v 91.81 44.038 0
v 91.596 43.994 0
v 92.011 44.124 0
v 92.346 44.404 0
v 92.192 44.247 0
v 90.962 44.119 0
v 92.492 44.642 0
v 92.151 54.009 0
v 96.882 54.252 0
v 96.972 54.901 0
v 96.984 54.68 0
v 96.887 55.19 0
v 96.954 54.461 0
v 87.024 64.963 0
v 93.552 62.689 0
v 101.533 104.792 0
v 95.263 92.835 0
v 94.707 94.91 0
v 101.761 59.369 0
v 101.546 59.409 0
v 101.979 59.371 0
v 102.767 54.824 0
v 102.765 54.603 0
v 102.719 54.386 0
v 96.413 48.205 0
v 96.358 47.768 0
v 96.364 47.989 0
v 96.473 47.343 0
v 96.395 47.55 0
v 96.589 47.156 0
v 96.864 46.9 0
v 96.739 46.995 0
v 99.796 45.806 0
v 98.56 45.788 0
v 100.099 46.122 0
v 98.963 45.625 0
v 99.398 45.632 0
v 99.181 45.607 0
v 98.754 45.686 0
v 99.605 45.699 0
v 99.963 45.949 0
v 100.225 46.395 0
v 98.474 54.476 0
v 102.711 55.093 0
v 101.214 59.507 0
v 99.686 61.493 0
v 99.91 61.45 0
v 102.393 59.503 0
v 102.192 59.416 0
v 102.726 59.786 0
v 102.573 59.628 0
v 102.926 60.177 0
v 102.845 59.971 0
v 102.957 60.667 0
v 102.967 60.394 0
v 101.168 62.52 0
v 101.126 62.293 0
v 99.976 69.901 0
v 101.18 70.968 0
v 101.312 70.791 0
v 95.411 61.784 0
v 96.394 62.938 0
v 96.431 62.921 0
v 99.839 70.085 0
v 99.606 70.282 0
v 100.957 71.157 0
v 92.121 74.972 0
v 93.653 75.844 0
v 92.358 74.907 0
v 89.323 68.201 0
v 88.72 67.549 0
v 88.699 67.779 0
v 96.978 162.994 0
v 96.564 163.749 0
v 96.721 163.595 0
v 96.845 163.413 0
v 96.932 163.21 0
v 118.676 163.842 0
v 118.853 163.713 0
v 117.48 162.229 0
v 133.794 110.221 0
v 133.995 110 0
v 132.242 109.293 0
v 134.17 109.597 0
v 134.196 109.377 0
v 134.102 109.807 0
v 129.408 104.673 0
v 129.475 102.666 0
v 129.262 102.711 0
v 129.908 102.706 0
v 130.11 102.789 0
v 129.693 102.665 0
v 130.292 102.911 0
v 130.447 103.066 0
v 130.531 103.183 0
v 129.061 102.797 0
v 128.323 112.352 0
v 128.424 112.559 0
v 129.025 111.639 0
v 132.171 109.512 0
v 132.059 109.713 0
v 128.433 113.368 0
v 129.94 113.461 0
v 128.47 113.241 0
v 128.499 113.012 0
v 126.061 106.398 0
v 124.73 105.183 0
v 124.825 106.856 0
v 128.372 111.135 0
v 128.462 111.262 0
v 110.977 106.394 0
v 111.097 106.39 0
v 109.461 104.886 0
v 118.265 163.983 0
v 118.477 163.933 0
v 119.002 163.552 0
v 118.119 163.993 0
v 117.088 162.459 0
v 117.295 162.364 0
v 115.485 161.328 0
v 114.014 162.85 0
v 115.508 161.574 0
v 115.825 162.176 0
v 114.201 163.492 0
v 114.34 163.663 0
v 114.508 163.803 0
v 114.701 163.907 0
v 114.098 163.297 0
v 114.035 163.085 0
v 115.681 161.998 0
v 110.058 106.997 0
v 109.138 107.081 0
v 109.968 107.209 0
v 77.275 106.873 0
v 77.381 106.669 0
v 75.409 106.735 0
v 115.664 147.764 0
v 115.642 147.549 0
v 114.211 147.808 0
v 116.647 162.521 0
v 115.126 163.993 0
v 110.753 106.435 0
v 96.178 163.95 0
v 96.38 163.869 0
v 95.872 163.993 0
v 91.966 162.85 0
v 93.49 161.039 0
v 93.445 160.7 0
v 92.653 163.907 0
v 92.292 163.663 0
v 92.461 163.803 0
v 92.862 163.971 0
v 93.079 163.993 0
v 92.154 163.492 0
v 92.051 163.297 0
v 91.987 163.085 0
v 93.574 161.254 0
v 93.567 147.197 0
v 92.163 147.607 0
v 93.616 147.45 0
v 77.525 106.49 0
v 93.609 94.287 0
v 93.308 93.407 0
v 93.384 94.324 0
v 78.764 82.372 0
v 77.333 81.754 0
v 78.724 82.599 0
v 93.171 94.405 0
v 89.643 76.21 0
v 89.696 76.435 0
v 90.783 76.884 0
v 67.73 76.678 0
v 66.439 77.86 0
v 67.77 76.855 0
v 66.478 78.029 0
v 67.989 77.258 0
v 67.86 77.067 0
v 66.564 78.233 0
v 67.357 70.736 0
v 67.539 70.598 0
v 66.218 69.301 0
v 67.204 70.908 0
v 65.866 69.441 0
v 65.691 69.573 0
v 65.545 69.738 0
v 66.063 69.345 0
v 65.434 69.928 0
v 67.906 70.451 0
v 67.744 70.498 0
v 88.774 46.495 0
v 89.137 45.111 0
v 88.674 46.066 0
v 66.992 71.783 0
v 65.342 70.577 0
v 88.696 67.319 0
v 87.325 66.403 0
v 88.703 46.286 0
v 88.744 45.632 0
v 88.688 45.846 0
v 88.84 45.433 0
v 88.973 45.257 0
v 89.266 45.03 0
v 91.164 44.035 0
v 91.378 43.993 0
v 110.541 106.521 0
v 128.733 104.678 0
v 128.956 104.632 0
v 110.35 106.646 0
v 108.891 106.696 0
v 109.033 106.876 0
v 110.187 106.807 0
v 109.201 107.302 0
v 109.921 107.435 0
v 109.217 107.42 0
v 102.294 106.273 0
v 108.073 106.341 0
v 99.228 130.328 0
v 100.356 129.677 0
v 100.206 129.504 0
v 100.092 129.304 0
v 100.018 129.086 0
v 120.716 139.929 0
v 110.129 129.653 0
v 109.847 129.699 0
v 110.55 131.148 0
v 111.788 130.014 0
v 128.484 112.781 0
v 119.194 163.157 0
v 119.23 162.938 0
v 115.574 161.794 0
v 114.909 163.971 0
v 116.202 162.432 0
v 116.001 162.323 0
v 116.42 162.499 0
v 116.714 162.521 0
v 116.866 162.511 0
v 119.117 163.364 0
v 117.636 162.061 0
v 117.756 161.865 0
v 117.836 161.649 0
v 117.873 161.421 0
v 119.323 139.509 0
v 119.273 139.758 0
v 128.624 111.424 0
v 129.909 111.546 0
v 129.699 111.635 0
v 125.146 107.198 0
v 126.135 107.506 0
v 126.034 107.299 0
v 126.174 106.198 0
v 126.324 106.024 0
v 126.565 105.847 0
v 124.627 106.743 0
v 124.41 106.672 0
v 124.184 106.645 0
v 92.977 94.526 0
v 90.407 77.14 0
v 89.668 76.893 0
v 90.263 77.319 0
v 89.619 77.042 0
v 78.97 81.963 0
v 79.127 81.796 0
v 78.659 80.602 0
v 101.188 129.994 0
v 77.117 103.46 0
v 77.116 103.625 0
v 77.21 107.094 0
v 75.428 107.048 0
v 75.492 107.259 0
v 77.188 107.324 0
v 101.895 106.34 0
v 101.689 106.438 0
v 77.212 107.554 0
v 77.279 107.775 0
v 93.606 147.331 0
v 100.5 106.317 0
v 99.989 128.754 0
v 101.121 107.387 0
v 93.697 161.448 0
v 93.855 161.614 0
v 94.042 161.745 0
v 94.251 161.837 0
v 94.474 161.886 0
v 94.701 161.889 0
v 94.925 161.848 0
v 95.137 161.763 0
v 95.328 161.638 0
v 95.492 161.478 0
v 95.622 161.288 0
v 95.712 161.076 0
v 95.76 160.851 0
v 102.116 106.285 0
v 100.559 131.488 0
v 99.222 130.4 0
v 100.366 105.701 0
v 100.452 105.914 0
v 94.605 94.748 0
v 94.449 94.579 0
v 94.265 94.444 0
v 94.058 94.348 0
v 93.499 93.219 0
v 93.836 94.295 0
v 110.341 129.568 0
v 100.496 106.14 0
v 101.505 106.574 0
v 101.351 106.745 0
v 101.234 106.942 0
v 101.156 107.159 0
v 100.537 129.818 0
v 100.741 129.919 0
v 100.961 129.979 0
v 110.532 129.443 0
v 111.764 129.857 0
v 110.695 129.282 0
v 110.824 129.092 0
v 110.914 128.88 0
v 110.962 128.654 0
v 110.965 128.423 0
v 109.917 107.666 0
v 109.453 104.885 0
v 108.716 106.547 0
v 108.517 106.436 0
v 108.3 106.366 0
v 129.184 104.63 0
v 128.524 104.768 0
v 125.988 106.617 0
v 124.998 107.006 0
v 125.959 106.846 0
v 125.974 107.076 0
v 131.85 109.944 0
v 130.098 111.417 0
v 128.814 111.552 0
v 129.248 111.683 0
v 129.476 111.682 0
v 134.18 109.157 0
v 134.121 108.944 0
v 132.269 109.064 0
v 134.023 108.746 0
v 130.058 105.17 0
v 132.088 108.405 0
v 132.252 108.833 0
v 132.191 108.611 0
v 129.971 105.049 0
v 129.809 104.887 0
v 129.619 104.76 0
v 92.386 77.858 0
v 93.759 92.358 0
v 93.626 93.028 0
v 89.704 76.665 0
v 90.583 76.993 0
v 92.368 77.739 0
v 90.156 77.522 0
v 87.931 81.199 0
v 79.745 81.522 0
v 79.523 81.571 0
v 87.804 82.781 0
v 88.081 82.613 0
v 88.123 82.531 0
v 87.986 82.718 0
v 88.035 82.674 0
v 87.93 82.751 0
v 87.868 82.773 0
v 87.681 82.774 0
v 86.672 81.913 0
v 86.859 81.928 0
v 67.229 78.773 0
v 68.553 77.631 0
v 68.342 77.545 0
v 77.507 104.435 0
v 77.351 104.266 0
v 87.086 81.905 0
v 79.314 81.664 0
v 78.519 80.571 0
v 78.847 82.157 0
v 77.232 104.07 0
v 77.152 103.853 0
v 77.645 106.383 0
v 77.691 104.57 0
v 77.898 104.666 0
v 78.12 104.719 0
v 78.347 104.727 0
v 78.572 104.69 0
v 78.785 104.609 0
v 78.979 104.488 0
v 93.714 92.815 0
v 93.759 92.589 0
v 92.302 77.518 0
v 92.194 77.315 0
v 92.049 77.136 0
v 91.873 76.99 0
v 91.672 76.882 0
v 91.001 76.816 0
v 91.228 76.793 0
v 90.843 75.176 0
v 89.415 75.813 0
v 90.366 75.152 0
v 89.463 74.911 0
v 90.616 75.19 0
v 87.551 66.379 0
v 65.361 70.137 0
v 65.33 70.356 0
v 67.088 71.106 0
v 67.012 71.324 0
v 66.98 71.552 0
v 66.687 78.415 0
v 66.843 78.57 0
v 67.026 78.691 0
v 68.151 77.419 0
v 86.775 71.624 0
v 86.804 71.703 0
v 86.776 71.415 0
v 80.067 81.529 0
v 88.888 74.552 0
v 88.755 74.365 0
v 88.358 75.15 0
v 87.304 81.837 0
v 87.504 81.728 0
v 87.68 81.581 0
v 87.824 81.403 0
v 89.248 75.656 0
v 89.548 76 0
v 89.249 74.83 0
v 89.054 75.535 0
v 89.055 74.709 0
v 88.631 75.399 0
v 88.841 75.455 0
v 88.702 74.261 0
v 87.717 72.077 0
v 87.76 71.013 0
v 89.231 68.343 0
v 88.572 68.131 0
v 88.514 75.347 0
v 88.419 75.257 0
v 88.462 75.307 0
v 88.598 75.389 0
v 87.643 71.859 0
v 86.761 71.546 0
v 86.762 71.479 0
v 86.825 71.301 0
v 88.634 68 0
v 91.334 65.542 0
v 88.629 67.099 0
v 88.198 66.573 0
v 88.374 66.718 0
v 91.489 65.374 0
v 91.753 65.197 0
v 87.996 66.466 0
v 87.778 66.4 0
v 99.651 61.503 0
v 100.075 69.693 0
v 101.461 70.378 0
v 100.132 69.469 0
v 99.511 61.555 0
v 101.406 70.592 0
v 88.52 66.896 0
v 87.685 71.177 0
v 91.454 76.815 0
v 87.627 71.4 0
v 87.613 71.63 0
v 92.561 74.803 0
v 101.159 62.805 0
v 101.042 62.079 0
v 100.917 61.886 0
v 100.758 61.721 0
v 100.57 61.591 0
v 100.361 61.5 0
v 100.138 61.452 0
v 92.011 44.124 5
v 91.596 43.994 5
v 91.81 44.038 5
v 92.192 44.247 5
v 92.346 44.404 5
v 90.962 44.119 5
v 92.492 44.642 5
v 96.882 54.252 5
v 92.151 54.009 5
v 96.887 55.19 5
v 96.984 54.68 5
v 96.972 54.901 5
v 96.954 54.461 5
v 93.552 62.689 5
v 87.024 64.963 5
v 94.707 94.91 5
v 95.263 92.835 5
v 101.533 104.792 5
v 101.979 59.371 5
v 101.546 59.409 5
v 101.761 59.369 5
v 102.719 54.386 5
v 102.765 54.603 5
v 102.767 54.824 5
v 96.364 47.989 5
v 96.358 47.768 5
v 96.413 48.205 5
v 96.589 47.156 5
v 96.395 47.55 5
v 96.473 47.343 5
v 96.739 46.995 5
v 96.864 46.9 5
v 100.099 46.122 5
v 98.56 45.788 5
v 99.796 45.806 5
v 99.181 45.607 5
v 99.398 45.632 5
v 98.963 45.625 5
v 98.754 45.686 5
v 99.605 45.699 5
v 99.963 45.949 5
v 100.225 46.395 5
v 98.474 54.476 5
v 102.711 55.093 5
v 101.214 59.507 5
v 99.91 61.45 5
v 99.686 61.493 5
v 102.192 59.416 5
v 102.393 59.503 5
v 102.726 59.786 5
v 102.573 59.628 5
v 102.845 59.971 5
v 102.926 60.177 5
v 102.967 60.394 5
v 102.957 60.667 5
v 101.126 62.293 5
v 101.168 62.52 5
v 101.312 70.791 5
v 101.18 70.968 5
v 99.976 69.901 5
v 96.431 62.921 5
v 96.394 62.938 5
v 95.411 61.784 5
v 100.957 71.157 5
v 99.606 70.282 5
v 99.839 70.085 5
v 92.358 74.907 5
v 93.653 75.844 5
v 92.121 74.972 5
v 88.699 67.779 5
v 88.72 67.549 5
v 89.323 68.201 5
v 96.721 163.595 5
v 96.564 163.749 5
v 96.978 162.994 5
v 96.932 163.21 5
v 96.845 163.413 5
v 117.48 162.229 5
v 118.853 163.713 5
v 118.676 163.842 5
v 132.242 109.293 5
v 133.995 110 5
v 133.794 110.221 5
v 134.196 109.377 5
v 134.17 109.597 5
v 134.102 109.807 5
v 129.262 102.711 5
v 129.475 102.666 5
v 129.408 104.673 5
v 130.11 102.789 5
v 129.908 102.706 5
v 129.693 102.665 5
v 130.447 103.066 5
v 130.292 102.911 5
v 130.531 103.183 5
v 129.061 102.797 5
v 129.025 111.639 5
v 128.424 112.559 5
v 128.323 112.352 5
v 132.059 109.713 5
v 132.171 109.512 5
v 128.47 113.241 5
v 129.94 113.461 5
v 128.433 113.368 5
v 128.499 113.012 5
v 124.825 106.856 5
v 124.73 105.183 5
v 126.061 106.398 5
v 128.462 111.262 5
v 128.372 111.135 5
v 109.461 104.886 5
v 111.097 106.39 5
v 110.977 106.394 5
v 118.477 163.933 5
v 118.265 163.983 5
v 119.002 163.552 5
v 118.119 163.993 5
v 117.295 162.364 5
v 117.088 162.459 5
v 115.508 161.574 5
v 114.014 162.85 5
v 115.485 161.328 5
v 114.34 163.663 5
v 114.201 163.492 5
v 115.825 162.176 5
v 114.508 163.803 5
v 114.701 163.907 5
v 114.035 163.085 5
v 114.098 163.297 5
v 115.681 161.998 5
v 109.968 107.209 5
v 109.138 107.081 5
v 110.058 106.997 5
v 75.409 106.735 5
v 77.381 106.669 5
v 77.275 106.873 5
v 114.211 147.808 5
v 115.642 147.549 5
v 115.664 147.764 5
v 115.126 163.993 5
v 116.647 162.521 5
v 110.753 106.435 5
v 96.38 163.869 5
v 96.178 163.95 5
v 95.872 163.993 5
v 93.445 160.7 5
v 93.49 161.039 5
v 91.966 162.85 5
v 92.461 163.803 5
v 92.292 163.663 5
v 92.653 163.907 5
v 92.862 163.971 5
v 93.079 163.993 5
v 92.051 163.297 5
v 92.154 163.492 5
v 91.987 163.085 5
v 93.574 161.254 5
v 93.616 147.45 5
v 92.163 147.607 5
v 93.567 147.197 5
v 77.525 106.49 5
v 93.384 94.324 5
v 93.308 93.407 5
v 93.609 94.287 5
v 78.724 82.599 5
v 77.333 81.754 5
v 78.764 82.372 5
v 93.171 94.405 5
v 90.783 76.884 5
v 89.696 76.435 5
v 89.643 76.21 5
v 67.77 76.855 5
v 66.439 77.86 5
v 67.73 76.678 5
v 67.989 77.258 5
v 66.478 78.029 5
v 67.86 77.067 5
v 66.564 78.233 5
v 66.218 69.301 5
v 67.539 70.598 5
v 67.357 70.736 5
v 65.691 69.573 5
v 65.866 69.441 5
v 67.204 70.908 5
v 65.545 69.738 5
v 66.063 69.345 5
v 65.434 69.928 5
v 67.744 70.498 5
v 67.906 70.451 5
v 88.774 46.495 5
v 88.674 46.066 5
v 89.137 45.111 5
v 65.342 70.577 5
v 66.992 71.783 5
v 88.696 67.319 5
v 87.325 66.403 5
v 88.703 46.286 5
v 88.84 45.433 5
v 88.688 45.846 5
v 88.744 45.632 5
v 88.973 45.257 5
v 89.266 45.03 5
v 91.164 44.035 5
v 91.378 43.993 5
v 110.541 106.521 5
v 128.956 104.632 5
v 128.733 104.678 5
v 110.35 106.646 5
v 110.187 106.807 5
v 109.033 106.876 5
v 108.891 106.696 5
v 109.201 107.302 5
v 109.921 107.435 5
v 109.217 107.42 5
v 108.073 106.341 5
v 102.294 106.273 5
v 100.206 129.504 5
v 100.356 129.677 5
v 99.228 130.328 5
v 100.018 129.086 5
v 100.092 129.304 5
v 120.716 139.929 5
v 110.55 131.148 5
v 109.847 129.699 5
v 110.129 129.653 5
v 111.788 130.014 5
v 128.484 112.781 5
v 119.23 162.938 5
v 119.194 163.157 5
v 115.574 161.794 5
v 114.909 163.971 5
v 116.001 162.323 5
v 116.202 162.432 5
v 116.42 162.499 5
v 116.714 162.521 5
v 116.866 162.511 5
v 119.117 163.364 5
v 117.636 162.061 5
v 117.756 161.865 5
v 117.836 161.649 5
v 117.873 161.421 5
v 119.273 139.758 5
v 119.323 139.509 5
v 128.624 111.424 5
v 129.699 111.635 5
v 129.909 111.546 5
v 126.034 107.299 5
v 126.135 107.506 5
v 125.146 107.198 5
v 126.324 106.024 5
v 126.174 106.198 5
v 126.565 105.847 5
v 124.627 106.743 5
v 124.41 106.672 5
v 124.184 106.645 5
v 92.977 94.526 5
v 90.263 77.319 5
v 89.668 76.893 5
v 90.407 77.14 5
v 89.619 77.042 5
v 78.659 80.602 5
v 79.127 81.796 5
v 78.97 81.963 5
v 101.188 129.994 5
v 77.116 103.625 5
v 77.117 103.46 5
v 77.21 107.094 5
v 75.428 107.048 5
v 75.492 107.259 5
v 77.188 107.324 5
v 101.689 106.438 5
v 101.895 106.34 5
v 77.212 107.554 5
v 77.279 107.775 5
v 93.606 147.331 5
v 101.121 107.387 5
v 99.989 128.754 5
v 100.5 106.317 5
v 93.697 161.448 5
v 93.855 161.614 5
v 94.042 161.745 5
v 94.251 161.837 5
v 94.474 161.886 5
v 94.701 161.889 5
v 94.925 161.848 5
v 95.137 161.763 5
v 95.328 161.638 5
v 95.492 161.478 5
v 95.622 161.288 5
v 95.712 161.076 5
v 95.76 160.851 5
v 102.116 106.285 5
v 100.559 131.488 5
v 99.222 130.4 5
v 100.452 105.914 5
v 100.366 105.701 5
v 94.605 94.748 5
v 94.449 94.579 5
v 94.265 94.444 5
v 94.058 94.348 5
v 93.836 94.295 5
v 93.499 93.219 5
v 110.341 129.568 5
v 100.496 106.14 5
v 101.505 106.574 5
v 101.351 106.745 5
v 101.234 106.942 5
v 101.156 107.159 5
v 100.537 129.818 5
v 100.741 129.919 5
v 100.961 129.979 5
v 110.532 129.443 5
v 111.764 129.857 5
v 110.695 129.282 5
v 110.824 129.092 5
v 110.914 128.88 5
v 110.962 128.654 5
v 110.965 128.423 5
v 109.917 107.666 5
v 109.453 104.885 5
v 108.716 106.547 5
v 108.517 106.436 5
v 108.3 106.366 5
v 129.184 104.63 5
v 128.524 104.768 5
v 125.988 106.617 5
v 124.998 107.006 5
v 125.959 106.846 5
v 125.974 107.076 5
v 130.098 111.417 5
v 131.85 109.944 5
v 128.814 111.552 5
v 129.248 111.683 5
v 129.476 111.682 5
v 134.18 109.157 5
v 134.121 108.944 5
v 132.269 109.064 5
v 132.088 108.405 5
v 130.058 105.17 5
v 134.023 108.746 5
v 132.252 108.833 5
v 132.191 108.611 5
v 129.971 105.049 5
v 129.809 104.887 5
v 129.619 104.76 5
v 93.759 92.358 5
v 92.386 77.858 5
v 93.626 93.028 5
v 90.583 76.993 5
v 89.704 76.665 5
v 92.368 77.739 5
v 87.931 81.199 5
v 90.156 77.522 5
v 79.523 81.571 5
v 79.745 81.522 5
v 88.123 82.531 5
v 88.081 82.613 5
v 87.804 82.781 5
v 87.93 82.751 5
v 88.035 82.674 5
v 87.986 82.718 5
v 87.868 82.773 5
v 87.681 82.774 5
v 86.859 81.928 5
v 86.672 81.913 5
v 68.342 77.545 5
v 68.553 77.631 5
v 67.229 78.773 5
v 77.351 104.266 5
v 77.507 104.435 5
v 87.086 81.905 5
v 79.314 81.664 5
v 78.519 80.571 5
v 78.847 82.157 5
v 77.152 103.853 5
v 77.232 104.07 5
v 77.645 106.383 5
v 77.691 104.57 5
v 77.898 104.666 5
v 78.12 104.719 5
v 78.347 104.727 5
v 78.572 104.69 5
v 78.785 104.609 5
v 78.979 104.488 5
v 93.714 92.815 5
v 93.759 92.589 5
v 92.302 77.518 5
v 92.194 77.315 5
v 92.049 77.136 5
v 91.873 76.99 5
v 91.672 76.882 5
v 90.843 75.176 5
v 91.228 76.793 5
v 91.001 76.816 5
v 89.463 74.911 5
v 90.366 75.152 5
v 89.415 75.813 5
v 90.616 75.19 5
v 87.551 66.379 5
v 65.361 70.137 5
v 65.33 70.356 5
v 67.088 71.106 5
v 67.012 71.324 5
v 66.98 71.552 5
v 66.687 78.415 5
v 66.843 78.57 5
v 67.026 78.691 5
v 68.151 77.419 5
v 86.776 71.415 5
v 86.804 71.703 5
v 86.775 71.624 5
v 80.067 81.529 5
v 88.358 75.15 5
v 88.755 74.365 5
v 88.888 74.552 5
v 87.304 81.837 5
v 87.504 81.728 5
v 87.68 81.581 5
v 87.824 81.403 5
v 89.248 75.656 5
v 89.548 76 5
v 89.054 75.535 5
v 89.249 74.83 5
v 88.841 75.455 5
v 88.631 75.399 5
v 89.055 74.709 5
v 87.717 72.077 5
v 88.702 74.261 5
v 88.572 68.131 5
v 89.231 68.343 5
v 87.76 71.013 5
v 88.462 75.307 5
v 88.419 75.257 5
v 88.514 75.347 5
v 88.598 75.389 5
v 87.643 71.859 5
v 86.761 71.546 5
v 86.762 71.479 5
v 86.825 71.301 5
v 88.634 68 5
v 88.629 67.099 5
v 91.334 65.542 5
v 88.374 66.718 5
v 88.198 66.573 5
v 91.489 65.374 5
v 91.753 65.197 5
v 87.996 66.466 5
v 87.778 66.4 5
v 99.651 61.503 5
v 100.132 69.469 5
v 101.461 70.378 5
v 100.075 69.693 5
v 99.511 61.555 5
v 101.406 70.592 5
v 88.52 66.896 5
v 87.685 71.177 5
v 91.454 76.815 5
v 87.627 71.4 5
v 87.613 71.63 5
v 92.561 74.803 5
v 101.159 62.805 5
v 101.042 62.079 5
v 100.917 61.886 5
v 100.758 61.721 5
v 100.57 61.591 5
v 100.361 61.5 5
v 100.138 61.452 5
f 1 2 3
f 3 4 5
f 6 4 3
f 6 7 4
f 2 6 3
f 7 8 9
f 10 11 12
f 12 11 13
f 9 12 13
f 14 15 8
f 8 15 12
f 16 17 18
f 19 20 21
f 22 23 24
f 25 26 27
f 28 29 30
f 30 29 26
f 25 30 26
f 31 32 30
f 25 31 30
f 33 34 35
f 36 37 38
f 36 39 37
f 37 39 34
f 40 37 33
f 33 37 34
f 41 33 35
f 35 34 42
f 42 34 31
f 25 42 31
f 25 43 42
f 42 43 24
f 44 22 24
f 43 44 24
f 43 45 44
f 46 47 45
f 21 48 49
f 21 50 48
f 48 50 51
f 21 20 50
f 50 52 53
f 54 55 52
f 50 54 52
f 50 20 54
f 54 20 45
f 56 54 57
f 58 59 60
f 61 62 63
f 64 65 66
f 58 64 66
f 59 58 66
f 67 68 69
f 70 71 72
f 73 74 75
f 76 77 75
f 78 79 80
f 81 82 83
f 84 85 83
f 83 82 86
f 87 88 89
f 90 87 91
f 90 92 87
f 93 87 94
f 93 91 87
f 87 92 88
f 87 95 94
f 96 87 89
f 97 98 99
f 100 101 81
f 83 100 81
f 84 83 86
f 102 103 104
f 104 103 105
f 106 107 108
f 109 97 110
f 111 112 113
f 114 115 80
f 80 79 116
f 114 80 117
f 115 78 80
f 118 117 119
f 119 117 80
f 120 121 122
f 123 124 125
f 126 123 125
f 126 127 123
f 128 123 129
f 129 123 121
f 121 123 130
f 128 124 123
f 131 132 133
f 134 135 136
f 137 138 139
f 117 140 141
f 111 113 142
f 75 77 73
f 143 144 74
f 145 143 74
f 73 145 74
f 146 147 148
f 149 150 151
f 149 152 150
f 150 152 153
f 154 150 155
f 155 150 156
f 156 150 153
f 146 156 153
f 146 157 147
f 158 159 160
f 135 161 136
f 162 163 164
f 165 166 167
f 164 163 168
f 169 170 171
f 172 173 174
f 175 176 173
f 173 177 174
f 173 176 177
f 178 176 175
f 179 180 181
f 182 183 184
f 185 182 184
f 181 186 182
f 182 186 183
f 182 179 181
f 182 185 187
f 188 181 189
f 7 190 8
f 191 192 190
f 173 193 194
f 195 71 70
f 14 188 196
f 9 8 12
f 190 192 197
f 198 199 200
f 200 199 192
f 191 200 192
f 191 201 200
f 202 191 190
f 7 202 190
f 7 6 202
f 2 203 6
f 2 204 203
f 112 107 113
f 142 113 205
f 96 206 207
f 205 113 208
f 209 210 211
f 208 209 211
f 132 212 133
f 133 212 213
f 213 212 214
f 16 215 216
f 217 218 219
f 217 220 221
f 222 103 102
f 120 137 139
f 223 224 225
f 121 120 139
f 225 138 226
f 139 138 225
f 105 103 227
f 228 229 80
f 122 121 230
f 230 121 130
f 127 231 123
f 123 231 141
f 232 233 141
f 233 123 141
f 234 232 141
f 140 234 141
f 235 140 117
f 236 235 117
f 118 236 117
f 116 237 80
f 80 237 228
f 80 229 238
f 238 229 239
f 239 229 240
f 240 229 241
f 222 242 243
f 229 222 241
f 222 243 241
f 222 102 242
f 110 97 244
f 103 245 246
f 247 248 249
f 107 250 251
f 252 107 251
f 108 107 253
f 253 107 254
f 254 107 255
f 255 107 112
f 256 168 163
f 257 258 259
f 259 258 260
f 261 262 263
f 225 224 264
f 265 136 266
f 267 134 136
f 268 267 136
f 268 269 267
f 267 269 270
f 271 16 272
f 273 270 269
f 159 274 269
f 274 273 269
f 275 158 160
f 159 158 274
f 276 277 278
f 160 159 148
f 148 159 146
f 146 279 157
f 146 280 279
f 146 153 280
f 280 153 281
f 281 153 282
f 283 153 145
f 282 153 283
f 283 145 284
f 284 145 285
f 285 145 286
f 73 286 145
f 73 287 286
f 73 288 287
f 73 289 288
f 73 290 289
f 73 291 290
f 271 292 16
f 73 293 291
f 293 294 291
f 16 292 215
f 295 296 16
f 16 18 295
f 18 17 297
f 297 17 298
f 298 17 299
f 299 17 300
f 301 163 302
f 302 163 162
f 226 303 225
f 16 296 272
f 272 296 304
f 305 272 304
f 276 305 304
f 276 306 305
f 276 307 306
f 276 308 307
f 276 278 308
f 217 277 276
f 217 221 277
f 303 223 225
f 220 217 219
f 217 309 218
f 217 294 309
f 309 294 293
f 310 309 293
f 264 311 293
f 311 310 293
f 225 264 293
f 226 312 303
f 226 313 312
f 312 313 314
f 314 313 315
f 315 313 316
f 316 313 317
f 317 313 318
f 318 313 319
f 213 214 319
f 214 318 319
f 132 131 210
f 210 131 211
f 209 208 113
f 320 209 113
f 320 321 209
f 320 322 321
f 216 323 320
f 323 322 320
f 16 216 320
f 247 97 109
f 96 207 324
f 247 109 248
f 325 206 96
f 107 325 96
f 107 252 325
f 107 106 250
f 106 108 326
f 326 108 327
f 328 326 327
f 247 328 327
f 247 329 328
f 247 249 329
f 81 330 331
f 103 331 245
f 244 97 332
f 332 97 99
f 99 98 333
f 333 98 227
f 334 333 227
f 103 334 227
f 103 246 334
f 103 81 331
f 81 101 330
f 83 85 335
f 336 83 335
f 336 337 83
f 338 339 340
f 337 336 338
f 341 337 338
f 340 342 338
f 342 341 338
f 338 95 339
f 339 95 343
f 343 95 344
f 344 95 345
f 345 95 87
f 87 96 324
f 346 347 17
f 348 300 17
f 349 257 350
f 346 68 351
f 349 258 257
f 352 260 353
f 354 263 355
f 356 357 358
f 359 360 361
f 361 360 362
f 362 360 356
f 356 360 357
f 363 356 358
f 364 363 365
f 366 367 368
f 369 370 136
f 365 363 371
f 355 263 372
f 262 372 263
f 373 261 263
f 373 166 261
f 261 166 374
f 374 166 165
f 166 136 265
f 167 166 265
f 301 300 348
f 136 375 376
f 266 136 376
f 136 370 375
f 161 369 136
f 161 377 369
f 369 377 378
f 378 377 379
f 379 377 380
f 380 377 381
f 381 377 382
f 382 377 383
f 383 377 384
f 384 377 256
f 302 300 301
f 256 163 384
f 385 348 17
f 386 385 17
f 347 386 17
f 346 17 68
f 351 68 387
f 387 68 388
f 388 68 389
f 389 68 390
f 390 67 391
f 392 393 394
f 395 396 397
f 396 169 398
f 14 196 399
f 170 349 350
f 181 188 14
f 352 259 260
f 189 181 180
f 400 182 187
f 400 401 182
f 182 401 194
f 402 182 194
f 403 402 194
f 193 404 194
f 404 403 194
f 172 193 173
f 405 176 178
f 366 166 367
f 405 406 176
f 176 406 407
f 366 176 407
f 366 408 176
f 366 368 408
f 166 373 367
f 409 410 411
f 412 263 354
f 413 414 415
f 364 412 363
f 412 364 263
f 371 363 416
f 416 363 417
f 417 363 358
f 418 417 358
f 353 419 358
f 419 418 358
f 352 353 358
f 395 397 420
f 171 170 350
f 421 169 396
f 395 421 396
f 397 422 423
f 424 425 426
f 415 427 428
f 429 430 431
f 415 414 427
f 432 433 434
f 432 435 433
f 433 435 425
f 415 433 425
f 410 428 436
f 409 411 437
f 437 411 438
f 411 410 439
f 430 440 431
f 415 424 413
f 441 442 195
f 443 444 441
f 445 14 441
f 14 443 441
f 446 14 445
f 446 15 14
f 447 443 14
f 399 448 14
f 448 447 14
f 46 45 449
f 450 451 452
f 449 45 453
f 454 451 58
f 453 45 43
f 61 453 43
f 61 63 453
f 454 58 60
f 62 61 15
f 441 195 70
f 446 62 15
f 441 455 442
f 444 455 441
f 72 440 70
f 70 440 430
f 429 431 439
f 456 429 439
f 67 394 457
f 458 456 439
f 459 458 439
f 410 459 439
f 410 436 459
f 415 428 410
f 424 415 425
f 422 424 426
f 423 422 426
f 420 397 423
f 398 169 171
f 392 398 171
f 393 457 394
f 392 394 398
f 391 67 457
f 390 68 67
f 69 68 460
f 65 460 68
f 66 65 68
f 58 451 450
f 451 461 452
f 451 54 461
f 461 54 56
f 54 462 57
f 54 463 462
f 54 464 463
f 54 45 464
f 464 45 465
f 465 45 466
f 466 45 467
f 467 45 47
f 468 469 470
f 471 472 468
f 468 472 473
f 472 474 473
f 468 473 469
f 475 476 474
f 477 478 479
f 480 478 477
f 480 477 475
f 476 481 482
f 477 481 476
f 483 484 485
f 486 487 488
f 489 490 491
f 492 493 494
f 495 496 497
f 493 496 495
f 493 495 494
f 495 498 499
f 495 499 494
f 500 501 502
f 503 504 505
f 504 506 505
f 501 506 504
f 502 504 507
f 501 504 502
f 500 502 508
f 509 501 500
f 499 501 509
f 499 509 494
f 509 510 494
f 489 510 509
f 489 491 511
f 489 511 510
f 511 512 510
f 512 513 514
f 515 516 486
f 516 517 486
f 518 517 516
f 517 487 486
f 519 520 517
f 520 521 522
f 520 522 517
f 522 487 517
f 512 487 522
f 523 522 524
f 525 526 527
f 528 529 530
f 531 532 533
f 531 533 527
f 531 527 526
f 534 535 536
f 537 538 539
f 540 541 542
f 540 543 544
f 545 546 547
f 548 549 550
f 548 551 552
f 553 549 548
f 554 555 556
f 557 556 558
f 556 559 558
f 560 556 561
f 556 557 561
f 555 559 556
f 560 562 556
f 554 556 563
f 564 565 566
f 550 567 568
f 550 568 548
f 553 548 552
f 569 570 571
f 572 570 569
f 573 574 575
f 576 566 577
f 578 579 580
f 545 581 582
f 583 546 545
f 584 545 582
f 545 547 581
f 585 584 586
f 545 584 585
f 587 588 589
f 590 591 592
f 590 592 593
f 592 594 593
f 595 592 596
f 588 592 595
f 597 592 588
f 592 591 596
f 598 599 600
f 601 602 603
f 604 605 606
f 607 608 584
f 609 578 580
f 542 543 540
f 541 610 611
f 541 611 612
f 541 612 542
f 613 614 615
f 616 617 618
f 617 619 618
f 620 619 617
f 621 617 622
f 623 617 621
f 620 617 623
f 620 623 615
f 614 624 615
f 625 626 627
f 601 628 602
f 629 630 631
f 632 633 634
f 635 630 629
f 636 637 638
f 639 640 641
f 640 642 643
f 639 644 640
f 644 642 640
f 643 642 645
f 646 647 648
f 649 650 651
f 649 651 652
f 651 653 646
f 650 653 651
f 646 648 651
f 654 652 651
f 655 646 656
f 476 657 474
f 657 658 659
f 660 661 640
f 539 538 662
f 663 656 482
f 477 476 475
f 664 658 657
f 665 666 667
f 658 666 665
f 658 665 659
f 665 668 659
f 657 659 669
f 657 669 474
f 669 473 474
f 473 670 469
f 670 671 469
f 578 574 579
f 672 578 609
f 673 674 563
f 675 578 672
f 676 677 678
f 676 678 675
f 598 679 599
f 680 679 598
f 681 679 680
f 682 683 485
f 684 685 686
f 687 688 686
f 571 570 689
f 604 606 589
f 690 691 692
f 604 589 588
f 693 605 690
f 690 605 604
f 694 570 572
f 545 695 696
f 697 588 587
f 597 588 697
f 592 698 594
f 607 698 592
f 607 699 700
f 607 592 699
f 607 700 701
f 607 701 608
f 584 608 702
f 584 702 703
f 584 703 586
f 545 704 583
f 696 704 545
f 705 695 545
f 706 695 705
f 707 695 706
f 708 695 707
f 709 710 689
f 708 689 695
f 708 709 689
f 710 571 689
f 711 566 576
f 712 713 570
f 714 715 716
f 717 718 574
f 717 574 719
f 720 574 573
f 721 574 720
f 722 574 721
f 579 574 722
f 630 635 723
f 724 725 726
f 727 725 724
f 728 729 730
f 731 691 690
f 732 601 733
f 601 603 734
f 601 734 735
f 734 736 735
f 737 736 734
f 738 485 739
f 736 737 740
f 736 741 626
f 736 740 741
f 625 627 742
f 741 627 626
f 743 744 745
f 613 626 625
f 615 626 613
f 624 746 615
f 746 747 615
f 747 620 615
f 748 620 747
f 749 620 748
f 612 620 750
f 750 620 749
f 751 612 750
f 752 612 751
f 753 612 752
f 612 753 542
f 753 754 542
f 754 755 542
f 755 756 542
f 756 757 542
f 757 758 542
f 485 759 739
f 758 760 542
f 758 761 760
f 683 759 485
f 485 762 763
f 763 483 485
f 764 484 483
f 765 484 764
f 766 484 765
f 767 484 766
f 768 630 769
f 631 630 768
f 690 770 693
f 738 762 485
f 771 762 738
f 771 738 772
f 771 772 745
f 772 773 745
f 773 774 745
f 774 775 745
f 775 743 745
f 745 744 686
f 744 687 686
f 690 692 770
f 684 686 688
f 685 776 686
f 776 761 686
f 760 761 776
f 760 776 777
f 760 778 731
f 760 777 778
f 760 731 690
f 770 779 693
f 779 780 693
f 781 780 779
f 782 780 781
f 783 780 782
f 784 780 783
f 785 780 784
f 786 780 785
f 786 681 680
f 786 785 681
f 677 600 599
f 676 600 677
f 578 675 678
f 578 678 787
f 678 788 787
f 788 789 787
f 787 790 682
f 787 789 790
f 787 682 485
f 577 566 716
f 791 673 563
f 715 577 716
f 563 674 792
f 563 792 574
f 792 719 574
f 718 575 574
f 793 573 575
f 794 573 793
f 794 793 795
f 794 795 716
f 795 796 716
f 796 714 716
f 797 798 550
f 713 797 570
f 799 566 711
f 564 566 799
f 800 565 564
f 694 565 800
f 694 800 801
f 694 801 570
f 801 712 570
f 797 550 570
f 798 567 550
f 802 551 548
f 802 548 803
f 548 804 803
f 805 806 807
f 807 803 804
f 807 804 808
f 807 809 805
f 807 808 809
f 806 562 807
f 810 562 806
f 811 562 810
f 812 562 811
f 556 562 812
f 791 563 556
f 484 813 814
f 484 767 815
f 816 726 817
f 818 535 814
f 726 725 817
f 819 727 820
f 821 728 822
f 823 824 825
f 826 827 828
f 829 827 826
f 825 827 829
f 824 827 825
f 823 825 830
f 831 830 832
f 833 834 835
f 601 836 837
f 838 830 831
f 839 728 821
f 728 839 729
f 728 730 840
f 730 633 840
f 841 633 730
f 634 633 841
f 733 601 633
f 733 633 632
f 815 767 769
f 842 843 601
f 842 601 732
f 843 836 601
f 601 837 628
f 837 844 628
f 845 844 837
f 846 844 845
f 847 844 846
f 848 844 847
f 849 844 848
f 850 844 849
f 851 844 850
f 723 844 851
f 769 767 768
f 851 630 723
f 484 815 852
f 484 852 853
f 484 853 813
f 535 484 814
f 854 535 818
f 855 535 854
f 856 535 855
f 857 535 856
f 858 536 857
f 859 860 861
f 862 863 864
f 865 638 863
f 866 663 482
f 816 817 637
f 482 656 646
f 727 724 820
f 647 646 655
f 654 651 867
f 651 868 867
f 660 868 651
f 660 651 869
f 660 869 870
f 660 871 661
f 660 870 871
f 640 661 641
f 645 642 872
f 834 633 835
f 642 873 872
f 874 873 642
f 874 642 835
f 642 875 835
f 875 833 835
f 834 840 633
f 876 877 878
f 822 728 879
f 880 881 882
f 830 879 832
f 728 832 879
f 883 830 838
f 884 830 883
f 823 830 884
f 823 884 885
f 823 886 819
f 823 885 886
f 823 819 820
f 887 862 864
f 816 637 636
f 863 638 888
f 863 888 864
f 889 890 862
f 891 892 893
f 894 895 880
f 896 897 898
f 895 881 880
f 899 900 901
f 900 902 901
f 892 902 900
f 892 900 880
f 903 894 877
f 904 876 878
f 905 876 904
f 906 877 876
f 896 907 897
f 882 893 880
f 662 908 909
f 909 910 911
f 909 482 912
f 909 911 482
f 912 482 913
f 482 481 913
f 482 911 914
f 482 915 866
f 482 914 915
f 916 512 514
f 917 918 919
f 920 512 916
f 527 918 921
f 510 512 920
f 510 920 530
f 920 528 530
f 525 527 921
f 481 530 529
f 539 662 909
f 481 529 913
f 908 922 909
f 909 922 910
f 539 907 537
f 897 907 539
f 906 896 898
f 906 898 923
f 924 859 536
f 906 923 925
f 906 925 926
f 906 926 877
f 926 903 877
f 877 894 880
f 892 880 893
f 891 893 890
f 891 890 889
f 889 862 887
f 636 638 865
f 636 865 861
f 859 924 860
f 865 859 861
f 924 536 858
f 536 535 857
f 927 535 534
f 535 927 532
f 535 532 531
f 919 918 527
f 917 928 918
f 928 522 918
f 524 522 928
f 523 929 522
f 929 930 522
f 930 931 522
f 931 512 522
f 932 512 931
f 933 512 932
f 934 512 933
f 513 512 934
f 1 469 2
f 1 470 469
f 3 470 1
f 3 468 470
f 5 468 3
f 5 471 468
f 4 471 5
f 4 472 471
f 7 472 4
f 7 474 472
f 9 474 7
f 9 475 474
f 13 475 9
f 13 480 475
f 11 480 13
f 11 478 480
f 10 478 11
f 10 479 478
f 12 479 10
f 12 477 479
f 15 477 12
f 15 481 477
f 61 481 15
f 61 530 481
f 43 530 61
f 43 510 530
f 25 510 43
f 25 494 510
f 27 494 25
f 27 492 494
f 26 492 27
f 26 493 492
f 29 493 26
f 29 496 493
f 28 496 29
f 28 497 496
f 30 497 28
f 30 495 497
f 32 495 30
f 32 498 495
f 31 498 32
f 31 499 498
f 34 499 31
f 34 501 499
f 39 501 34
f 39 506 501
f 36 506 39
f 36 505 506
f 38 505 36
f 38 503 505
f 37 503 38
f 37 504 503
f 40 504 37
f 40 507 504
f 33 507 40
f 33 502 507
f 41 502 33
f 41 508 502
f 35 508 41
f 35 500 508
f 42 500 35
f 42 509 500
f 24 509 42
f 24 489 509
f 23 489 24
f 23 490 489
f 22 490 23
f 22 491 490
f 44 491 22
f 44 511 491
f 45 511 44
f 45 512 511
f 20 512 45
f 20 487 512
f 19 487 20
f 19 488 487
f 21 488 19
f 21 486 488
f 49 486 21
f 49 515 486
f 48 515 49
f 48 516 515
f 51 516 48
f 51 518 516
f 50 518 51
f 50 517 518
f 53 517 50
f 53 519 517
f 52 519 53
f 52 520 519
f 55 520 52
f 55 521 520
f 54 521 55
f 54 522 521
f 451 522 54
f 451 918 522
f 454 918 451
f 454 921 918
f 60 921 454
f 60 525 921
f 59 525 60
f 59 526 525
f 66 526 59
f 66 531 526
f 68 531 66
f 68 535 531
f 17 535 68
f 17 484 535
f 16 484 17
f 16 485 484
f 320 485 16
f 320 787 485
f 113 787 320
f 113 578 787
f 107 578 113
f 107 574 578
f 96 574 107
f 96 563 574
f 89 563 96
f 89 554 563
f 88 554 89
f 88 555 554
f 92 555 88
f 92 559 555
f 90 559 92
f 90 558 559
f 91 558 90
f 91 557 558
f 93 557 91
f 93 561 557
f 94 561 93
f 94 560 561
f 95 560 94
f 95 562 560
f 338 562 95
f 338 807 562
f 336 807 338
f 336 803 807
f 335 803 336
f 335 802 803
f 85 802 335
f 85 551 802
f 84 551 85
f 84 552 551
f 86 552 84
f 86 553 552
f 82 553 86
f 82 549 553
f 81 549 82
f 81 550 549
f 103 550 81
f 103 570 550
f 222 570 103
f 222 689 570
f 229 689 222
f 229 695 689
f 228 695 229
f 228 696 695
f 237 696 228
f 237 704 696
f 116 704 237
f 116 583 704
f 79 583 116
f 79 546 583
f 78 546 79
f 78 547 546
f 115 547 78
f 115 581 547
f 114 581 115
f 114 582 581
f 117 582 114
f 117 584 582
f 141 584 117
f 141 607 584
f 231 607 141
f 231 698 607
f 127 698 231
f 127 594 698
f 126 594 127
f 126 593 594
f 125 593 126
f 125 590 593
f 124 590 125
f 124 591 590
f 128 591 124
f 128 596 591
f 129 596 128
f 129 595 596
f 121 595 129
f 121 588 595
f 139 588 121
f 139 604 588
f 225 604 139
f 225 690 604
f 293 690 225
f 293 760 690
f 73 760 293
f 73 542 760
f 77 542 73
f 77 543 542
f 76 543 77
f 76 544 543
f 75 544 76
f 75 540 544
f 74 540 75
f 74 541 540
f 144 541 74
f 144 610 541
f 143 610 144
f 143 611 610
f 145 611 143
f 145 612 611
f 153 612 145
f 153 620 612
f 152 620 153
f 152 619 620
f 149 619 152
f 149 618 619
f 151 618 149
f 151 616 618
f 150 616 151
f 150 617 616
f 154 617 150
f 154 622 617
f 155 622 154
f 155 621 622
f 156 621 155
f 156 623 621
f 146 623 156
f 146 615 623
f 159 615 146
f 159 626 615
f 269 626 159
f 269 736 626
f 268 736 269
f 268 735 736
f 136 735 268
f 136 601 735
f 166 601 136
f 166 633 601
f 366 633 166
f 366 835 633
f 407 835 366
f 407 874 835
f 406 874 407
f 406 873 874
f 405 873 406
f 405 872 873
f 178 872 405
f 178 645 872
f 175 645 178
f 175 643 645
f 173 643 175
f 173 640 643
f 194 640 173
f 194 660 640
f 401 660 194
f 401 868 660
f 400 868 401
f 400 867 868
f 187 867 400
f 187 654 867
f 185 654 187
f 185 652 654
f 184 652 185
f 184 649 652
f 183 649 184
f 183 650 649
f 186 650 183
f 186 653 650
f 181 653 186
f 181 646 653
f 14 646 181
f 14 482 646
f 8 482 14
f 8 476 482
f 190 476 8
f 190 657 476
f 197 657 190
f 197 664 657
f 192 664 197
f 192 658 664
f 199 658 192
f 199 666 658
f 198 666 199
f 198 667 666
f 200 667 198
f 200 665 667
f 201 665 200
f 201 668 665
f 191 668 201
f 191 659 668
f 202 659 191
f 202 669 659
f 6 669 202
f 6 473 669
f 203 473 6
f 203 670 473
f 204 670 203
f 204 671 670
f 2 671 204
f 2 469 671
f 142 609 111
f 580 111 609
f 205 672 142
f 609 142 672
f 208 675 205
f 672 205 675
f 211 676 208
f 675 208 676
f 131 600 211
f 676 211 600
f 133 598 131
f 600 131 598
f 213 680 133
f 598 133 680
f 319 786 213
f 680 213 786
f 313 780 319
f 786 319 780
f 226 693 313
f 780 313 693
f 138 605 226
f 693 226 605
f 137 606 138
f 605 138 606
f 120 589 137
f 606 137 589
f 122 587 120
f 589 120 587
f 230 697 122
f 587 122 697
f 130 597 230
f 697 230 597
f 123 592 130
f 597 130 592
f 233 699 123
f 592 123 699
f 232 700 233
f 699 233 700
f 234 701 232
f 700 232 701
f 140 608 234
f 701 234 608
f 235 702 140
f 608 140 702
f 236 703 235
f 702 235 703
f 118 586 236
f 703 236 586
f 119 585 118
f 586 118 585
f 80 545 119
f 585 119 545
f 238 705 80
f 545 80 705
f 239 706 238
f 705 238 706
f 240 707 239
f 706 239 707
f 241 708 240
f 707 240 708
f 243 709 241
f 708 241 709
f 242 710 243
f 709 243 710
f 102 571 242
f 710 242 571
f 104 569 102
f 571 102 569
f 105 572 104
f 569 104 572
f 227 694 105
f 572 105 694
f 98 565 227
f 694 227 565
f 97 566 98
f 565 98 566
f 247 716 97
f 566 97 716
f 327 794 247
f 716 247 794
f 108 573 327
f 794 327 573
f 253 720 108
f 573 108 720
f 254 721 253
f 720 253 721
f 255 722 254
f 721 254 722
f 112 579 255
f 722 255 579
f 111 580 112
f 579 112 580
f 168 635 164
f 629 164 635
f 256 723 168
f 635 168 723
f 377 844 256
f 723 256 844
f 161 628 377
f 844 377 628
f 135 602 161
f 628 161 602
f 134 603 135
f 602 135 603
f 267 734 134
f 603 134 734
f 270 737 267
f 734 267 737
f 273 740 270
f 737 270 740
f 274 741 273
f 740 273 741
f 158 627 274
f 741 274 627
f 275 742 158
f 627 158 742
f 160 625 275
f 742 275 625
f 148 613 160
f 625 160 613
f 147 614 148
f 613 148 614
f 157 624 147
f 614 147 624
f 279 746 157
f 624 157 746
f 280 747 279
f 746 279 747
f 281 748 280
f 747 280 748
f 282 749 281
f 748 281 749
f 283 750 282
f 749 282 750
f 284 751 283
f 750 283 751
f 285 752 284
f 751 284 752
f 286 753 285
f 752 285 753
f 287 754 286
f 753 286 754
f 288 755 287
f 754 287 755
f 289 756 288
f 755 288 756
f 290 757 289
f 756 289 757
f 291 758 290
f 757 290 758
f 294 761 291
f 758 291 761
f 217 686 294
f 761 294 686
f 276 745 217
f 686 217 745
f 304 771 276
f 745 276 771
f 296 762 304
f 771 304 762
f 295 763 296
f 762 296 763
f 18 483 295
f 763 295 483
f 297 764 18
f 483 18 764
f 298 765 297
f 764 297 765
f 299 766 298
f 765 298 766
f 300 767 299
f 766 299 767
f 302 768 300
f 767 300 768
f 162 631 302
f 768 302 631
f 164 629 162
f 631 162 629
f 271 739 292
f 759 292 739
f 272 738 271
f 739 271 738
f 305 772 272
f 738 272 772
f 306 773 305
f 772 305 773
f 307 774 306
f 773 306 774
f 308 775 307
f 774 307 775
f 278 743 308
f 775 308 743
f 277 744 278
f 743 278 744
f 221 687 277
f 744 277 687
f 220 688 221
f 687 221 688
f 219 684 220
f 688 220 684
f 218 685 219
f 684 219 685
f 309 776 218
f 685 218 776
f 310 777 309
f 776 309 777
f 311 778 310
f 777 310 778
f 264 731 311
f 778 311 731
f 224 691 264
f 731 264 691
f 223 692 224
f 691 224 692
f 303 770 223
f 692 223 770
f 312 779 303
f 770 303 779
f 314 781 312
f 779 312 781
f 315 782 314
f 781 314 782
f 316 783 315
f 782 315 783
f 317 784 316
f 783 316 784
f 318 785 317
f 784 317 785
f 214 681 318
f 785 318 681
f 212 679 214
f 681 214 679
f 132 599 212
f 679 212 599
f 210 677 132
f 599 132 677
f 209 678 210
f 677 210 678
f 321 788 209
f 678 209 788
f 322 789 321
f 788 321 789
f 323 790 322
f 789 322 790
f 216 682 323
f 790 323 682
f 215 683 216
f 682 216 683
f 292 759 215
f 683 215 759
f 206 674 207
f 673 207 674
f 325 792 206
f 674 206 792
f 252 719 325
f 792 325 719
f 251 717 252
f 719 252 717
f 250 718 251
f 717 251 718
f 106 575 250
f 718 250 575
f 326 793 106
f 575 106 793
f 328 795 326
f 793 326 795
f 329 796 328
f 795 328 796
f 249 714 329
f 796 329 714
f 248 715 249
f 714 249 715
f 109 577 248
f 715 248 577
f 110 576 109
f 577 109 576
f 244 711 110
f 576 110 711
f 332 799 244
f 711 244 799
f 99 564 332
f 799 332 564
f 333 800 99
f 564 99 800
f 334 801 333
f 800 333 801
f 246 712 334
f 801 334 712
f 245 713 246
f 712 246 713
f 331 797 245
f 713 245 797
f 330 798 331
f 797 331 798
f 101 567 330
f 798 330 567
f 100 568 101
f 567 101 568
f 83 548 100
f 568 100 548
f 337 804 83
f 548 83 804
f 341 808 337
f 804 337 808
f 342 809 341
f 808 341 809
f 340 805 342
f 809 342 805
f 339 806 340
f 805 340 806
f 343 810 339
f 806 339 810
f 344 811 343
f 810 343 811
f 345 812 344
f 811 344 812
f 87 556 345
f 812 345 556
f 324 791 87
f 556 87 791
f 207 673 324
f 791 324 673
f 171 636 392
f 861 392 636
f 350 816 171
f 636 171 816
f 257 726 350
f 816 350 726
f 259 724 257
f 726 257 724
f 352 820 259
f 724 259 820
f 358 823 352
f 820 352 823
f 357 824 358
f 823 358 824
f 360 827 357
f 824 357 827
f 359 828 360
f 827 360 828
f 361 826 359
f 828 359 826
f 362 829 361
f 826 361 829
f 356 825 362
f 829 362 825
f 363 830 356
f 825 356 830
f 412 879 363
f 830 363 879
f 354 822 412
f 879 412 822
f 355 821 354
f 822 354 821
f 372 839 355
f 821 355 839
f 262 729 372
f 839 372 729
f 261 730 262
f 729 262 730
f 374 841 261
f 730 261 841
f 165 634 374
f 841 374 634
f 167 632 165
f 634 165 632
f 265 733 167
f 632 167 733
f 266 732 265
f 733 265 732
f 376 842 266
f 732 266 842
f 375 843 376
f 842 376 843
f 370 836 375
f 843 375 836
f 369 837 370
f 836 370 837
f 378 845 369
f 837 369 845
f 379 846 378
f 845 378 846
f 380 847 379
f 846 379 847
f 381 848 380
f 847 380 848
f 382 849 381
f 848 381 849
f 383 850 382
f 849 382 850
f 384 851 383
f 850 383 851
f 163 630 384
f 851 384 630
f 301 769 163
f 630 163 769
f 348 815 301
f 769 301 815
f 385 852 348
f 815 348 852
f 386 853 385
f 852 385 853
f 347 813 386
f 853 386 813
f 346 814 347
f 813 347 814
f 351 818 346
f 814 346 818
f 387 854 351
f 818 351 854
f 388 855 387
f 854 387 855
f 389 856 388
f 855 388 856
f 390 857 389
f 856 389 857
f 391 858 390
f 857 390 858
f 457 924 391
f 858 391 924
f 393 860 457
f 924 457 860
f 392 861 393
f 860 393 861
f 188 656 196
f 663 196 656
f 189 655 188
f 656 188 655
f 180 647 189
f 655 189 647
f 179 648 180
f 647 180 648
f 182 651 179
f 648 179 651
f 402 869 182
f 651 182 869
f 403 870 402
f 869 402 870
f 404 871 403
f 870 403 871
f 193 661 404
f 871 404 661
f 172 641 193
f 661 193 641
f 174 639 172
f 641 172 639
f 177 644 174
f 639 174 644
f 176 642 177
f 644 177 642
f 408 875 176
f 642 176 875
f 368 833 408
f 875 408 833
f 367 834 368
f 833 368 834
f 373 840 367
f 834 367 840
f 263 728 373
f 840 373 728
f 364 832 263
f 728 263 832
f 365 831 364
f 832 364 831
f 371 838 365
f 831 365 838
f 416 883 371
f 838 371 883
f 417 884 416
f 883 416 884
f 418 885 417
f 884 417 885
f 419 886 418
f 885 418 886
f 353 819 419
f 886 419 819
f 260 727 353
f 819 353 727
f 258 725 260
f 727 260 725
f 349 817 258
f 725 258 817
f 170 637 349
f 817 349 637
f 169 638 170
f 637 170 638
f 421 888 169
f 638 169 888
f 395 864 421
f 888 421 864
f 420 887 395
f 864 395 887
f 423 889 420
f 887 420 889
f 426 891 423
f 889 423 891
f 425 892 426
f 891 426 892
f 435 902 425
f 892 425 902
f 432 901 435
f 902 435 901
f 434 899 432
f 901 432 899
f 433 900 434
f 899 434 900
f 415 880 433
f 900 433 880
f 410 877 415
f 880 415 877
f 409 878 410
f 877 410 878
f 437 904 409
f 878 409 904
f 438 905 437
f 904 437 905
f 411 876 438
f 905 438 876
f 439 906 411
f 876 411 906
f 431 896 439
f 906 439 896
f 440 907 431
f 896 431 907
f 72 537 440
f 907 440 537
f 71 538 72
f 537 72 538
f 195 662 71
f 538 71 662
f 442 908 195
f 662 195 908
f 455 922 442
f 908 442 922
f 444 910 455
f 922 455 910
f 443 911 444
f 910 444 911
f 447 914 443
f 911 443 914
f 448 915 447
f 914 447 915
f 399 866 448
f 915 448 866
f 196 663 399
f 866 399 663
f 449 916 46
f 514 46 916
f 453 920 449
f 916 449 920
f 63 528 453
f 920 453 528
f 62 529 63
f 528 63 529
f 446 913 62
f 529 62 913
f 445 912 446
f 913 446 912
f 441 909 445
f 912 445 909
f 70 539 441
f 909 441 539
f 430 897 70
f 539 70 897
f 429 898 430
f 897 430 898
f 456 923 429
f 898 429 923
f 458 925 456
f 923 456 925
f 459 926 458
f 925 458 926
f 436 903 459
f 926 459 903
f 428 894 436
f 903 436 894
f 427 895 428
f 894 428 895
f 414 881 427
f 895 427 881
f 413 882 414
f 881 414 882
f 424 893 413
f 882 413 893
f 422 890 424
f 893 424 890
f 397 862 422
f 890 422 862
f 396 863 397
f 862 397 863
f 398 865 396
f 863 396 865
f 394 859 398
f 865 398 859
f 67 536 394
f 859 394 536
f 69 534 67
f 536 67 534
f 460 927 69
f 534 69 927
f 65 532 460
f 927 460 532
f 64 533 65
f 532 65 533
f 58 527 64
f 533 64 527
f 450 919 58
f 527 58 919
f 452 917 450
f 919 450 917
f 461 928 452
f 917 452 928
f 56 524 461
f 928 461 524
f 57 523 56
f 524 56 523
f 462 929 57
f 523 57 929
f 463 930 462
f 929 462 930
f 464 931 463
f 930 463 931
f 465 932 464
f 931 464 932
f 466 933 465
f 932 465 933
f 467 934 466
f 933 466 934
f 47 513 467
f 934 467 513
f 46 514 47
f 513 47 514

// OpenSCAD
/*
 * Customizable Origami - Deer - https://www.thingiverse.com/thing:2670305
 * by Dennis Hofmann - https://www.thingiverse.com/mightynozzle/about
 * created 2017-11-26
 * version v1.0
 *
 * Changelog
 * --------------
 * v1.0:
 *      - final design
 * --------------
 * 
 * This work is licensed under the Creative Commons - Attribution - NonCommercial - ShareAlike license.
 * https://creativecommons.org/licenses/by-nc-sa/3.0/
 */


 // Parameter Section //
//-------------------//

// preview[view:north, tilt:top]

// The maximum size of the longest side. The shorter side will be automatically resized in same ratio.
max_size_in_millimeter = 120; //[20:300]

// The height of the model.
model_height_in_millimeter = 5; //[0.2:0.2:100]

// Thickness of the outer outline.
outline_size_in_millimeter = 1.5; //[0.5:0.1:20]

// Thickness of the inner outline.
inline_size_in_millimeter = 0.7; //[0.5:0.1:20]

// Roundiness of the ends of the inner outlines.
inline_edge_radius_in_millimeter = 1.2; //[0.0:0.1:5]

// Flip model
flip_model = "no"; //[yes,no]

/*[hidden]*/
max_size = max_size_in_millimeter;
model_height = model_height_in_millimeter;
$fn=32;

// Outer Points
A1 = [677, 768];
A2 = [666, 696];
A3 = [880, 652];
A4 = [936, 534];
A5 = [900, 455];
A6 = [917, 446];
A7 = [961, 541];
A8 = [915, 643];
A9 = [965, 619];
A10 = [999, 539];
A11 = [977, 473];
A12 = [994, 462];
A13 = [1019, 541];
A14 = [997, 605];
A15 = [1021, 598];
A16 = [1006, 694];
A17 = [927, 744];
A18 = [944, 921];
A19 = [1011, 1047];
A20 = [1097, 1048];
A21 = [1253, 1051];
A22 = [1299, 1026];
A23 = [1334, 1081];
A24 = [1293, 1115];
A25 = [1199, 1381];
A26 = [1184, 1610];
A27 = [1154, 1610];
A28 = [1156, 1460];
A29 = [1117, 1285];
A30 = [998, 1289];
A31 = [961, 1610];
A32 = [933, 1610];
A33 = [935, 1457];
A34 = [767, 1056];
A35 = [787, 800];

outline = [A1, A2, A3, A4, A5, A6, A7, A8, A9, A10, A11, A12, A13, A14, A15, A16, A17, A18, A19, A20, A21, A22, A23, A24, A25, A26, A27, A28, A29, A30, A31, A32, A33, A34, A35];

// Inner Points
B1 = [873, 707];
B2 = [889, 742];
B3 = [908, 747];
B4 = [880, 815];
B5 = [892, 673];

// Polygons
C1 = [A2, A3, A8, B5, B1, B2, B3, B4, A35, A1];
C2 = [A3, A4, A5, A6, A7, A8];
C3 = [A11, A12, A13, A14, A9, A10];
C4 = [A8, A9, A14, A15, A16, A17, B3, B2, B1, B5];
C5 = [B3, A17, A18, A34, A35, B4];
C6 = [A18, A19, A30, A31, A32, A33, A34];
C7 = [A19, A20, A29, A30];
C8 = [A20, A21, A24, A25, A26, A27, A28, A29];
C9 = [A21, A24, A23, A22];

cut_polygons = [C1, /*C2, C3,*/ C4, C5, C6, C7, C8, C9];

min_x = A2[0];
min_y = A6[1];
max_x = A23[0];
max_y = A26[1];

x_size = max_x - min_x;
y_size = max_y - min_y;

x_factor = max_size / x_size;
y_factor = max_size / y_size;

inline_size = x_size > y_size ? inline_size_in_millimeter / x_factor / 2: inline_size_in_millimeter / y_factor / 2;
inline_edge_radius = x_size > y_size ? inline_edge_radius_in_millimeter / x_factor: inline_edge_radius_in_millimeter / y_factor;
outline_size = x_size > y_size ? outline_size_in_millimeter / x_factor - inline_size: outline_size_in_millimeter / y_factor - inline_size;


 // Program Section //
//-----------------//

if(x_size > y_size) {
    resize(newsize=[max_size, x_factor * y_size, model_height]){
        if(flip_model == "yes") {
            mirror([0,1,0]) {
                rotate([180,180,0]) {    
                    create(outline, cut_polygons);
                }
            }
        } else {
            create(outline, cut_polygons);
        }
    }
} else {
    resize(newsize=[y_factor * x_size, max_size, model_height]){
        if(flip_model == "yes") {
            mirror([0,1,0]) {
                rotate([180,180,0]) {    
                    create(outline, cut_polygons);
                }
            }
        } else {
            create(outline, cut_polygons);
        }
    }
}


 // Module Section //
//----------------//

module create() {
    linear_extrude(height=1) {
        difference() {
            offset(r = -0) {
                offset(r = +outline_size) {
                    polygon(points = outline, convexity = 10);
                }
            }
            
            for(cut_polygon = [0:len(cut_polygons)]) {
                offset(r = +inline_edge_radius) {
                    offset(r = -inline_size - inline_edge_radius) {
                        polygon(points = cut_polygons[cut_polygon], convexity = 10);
                    }
                }
            }
        }
    }
}
